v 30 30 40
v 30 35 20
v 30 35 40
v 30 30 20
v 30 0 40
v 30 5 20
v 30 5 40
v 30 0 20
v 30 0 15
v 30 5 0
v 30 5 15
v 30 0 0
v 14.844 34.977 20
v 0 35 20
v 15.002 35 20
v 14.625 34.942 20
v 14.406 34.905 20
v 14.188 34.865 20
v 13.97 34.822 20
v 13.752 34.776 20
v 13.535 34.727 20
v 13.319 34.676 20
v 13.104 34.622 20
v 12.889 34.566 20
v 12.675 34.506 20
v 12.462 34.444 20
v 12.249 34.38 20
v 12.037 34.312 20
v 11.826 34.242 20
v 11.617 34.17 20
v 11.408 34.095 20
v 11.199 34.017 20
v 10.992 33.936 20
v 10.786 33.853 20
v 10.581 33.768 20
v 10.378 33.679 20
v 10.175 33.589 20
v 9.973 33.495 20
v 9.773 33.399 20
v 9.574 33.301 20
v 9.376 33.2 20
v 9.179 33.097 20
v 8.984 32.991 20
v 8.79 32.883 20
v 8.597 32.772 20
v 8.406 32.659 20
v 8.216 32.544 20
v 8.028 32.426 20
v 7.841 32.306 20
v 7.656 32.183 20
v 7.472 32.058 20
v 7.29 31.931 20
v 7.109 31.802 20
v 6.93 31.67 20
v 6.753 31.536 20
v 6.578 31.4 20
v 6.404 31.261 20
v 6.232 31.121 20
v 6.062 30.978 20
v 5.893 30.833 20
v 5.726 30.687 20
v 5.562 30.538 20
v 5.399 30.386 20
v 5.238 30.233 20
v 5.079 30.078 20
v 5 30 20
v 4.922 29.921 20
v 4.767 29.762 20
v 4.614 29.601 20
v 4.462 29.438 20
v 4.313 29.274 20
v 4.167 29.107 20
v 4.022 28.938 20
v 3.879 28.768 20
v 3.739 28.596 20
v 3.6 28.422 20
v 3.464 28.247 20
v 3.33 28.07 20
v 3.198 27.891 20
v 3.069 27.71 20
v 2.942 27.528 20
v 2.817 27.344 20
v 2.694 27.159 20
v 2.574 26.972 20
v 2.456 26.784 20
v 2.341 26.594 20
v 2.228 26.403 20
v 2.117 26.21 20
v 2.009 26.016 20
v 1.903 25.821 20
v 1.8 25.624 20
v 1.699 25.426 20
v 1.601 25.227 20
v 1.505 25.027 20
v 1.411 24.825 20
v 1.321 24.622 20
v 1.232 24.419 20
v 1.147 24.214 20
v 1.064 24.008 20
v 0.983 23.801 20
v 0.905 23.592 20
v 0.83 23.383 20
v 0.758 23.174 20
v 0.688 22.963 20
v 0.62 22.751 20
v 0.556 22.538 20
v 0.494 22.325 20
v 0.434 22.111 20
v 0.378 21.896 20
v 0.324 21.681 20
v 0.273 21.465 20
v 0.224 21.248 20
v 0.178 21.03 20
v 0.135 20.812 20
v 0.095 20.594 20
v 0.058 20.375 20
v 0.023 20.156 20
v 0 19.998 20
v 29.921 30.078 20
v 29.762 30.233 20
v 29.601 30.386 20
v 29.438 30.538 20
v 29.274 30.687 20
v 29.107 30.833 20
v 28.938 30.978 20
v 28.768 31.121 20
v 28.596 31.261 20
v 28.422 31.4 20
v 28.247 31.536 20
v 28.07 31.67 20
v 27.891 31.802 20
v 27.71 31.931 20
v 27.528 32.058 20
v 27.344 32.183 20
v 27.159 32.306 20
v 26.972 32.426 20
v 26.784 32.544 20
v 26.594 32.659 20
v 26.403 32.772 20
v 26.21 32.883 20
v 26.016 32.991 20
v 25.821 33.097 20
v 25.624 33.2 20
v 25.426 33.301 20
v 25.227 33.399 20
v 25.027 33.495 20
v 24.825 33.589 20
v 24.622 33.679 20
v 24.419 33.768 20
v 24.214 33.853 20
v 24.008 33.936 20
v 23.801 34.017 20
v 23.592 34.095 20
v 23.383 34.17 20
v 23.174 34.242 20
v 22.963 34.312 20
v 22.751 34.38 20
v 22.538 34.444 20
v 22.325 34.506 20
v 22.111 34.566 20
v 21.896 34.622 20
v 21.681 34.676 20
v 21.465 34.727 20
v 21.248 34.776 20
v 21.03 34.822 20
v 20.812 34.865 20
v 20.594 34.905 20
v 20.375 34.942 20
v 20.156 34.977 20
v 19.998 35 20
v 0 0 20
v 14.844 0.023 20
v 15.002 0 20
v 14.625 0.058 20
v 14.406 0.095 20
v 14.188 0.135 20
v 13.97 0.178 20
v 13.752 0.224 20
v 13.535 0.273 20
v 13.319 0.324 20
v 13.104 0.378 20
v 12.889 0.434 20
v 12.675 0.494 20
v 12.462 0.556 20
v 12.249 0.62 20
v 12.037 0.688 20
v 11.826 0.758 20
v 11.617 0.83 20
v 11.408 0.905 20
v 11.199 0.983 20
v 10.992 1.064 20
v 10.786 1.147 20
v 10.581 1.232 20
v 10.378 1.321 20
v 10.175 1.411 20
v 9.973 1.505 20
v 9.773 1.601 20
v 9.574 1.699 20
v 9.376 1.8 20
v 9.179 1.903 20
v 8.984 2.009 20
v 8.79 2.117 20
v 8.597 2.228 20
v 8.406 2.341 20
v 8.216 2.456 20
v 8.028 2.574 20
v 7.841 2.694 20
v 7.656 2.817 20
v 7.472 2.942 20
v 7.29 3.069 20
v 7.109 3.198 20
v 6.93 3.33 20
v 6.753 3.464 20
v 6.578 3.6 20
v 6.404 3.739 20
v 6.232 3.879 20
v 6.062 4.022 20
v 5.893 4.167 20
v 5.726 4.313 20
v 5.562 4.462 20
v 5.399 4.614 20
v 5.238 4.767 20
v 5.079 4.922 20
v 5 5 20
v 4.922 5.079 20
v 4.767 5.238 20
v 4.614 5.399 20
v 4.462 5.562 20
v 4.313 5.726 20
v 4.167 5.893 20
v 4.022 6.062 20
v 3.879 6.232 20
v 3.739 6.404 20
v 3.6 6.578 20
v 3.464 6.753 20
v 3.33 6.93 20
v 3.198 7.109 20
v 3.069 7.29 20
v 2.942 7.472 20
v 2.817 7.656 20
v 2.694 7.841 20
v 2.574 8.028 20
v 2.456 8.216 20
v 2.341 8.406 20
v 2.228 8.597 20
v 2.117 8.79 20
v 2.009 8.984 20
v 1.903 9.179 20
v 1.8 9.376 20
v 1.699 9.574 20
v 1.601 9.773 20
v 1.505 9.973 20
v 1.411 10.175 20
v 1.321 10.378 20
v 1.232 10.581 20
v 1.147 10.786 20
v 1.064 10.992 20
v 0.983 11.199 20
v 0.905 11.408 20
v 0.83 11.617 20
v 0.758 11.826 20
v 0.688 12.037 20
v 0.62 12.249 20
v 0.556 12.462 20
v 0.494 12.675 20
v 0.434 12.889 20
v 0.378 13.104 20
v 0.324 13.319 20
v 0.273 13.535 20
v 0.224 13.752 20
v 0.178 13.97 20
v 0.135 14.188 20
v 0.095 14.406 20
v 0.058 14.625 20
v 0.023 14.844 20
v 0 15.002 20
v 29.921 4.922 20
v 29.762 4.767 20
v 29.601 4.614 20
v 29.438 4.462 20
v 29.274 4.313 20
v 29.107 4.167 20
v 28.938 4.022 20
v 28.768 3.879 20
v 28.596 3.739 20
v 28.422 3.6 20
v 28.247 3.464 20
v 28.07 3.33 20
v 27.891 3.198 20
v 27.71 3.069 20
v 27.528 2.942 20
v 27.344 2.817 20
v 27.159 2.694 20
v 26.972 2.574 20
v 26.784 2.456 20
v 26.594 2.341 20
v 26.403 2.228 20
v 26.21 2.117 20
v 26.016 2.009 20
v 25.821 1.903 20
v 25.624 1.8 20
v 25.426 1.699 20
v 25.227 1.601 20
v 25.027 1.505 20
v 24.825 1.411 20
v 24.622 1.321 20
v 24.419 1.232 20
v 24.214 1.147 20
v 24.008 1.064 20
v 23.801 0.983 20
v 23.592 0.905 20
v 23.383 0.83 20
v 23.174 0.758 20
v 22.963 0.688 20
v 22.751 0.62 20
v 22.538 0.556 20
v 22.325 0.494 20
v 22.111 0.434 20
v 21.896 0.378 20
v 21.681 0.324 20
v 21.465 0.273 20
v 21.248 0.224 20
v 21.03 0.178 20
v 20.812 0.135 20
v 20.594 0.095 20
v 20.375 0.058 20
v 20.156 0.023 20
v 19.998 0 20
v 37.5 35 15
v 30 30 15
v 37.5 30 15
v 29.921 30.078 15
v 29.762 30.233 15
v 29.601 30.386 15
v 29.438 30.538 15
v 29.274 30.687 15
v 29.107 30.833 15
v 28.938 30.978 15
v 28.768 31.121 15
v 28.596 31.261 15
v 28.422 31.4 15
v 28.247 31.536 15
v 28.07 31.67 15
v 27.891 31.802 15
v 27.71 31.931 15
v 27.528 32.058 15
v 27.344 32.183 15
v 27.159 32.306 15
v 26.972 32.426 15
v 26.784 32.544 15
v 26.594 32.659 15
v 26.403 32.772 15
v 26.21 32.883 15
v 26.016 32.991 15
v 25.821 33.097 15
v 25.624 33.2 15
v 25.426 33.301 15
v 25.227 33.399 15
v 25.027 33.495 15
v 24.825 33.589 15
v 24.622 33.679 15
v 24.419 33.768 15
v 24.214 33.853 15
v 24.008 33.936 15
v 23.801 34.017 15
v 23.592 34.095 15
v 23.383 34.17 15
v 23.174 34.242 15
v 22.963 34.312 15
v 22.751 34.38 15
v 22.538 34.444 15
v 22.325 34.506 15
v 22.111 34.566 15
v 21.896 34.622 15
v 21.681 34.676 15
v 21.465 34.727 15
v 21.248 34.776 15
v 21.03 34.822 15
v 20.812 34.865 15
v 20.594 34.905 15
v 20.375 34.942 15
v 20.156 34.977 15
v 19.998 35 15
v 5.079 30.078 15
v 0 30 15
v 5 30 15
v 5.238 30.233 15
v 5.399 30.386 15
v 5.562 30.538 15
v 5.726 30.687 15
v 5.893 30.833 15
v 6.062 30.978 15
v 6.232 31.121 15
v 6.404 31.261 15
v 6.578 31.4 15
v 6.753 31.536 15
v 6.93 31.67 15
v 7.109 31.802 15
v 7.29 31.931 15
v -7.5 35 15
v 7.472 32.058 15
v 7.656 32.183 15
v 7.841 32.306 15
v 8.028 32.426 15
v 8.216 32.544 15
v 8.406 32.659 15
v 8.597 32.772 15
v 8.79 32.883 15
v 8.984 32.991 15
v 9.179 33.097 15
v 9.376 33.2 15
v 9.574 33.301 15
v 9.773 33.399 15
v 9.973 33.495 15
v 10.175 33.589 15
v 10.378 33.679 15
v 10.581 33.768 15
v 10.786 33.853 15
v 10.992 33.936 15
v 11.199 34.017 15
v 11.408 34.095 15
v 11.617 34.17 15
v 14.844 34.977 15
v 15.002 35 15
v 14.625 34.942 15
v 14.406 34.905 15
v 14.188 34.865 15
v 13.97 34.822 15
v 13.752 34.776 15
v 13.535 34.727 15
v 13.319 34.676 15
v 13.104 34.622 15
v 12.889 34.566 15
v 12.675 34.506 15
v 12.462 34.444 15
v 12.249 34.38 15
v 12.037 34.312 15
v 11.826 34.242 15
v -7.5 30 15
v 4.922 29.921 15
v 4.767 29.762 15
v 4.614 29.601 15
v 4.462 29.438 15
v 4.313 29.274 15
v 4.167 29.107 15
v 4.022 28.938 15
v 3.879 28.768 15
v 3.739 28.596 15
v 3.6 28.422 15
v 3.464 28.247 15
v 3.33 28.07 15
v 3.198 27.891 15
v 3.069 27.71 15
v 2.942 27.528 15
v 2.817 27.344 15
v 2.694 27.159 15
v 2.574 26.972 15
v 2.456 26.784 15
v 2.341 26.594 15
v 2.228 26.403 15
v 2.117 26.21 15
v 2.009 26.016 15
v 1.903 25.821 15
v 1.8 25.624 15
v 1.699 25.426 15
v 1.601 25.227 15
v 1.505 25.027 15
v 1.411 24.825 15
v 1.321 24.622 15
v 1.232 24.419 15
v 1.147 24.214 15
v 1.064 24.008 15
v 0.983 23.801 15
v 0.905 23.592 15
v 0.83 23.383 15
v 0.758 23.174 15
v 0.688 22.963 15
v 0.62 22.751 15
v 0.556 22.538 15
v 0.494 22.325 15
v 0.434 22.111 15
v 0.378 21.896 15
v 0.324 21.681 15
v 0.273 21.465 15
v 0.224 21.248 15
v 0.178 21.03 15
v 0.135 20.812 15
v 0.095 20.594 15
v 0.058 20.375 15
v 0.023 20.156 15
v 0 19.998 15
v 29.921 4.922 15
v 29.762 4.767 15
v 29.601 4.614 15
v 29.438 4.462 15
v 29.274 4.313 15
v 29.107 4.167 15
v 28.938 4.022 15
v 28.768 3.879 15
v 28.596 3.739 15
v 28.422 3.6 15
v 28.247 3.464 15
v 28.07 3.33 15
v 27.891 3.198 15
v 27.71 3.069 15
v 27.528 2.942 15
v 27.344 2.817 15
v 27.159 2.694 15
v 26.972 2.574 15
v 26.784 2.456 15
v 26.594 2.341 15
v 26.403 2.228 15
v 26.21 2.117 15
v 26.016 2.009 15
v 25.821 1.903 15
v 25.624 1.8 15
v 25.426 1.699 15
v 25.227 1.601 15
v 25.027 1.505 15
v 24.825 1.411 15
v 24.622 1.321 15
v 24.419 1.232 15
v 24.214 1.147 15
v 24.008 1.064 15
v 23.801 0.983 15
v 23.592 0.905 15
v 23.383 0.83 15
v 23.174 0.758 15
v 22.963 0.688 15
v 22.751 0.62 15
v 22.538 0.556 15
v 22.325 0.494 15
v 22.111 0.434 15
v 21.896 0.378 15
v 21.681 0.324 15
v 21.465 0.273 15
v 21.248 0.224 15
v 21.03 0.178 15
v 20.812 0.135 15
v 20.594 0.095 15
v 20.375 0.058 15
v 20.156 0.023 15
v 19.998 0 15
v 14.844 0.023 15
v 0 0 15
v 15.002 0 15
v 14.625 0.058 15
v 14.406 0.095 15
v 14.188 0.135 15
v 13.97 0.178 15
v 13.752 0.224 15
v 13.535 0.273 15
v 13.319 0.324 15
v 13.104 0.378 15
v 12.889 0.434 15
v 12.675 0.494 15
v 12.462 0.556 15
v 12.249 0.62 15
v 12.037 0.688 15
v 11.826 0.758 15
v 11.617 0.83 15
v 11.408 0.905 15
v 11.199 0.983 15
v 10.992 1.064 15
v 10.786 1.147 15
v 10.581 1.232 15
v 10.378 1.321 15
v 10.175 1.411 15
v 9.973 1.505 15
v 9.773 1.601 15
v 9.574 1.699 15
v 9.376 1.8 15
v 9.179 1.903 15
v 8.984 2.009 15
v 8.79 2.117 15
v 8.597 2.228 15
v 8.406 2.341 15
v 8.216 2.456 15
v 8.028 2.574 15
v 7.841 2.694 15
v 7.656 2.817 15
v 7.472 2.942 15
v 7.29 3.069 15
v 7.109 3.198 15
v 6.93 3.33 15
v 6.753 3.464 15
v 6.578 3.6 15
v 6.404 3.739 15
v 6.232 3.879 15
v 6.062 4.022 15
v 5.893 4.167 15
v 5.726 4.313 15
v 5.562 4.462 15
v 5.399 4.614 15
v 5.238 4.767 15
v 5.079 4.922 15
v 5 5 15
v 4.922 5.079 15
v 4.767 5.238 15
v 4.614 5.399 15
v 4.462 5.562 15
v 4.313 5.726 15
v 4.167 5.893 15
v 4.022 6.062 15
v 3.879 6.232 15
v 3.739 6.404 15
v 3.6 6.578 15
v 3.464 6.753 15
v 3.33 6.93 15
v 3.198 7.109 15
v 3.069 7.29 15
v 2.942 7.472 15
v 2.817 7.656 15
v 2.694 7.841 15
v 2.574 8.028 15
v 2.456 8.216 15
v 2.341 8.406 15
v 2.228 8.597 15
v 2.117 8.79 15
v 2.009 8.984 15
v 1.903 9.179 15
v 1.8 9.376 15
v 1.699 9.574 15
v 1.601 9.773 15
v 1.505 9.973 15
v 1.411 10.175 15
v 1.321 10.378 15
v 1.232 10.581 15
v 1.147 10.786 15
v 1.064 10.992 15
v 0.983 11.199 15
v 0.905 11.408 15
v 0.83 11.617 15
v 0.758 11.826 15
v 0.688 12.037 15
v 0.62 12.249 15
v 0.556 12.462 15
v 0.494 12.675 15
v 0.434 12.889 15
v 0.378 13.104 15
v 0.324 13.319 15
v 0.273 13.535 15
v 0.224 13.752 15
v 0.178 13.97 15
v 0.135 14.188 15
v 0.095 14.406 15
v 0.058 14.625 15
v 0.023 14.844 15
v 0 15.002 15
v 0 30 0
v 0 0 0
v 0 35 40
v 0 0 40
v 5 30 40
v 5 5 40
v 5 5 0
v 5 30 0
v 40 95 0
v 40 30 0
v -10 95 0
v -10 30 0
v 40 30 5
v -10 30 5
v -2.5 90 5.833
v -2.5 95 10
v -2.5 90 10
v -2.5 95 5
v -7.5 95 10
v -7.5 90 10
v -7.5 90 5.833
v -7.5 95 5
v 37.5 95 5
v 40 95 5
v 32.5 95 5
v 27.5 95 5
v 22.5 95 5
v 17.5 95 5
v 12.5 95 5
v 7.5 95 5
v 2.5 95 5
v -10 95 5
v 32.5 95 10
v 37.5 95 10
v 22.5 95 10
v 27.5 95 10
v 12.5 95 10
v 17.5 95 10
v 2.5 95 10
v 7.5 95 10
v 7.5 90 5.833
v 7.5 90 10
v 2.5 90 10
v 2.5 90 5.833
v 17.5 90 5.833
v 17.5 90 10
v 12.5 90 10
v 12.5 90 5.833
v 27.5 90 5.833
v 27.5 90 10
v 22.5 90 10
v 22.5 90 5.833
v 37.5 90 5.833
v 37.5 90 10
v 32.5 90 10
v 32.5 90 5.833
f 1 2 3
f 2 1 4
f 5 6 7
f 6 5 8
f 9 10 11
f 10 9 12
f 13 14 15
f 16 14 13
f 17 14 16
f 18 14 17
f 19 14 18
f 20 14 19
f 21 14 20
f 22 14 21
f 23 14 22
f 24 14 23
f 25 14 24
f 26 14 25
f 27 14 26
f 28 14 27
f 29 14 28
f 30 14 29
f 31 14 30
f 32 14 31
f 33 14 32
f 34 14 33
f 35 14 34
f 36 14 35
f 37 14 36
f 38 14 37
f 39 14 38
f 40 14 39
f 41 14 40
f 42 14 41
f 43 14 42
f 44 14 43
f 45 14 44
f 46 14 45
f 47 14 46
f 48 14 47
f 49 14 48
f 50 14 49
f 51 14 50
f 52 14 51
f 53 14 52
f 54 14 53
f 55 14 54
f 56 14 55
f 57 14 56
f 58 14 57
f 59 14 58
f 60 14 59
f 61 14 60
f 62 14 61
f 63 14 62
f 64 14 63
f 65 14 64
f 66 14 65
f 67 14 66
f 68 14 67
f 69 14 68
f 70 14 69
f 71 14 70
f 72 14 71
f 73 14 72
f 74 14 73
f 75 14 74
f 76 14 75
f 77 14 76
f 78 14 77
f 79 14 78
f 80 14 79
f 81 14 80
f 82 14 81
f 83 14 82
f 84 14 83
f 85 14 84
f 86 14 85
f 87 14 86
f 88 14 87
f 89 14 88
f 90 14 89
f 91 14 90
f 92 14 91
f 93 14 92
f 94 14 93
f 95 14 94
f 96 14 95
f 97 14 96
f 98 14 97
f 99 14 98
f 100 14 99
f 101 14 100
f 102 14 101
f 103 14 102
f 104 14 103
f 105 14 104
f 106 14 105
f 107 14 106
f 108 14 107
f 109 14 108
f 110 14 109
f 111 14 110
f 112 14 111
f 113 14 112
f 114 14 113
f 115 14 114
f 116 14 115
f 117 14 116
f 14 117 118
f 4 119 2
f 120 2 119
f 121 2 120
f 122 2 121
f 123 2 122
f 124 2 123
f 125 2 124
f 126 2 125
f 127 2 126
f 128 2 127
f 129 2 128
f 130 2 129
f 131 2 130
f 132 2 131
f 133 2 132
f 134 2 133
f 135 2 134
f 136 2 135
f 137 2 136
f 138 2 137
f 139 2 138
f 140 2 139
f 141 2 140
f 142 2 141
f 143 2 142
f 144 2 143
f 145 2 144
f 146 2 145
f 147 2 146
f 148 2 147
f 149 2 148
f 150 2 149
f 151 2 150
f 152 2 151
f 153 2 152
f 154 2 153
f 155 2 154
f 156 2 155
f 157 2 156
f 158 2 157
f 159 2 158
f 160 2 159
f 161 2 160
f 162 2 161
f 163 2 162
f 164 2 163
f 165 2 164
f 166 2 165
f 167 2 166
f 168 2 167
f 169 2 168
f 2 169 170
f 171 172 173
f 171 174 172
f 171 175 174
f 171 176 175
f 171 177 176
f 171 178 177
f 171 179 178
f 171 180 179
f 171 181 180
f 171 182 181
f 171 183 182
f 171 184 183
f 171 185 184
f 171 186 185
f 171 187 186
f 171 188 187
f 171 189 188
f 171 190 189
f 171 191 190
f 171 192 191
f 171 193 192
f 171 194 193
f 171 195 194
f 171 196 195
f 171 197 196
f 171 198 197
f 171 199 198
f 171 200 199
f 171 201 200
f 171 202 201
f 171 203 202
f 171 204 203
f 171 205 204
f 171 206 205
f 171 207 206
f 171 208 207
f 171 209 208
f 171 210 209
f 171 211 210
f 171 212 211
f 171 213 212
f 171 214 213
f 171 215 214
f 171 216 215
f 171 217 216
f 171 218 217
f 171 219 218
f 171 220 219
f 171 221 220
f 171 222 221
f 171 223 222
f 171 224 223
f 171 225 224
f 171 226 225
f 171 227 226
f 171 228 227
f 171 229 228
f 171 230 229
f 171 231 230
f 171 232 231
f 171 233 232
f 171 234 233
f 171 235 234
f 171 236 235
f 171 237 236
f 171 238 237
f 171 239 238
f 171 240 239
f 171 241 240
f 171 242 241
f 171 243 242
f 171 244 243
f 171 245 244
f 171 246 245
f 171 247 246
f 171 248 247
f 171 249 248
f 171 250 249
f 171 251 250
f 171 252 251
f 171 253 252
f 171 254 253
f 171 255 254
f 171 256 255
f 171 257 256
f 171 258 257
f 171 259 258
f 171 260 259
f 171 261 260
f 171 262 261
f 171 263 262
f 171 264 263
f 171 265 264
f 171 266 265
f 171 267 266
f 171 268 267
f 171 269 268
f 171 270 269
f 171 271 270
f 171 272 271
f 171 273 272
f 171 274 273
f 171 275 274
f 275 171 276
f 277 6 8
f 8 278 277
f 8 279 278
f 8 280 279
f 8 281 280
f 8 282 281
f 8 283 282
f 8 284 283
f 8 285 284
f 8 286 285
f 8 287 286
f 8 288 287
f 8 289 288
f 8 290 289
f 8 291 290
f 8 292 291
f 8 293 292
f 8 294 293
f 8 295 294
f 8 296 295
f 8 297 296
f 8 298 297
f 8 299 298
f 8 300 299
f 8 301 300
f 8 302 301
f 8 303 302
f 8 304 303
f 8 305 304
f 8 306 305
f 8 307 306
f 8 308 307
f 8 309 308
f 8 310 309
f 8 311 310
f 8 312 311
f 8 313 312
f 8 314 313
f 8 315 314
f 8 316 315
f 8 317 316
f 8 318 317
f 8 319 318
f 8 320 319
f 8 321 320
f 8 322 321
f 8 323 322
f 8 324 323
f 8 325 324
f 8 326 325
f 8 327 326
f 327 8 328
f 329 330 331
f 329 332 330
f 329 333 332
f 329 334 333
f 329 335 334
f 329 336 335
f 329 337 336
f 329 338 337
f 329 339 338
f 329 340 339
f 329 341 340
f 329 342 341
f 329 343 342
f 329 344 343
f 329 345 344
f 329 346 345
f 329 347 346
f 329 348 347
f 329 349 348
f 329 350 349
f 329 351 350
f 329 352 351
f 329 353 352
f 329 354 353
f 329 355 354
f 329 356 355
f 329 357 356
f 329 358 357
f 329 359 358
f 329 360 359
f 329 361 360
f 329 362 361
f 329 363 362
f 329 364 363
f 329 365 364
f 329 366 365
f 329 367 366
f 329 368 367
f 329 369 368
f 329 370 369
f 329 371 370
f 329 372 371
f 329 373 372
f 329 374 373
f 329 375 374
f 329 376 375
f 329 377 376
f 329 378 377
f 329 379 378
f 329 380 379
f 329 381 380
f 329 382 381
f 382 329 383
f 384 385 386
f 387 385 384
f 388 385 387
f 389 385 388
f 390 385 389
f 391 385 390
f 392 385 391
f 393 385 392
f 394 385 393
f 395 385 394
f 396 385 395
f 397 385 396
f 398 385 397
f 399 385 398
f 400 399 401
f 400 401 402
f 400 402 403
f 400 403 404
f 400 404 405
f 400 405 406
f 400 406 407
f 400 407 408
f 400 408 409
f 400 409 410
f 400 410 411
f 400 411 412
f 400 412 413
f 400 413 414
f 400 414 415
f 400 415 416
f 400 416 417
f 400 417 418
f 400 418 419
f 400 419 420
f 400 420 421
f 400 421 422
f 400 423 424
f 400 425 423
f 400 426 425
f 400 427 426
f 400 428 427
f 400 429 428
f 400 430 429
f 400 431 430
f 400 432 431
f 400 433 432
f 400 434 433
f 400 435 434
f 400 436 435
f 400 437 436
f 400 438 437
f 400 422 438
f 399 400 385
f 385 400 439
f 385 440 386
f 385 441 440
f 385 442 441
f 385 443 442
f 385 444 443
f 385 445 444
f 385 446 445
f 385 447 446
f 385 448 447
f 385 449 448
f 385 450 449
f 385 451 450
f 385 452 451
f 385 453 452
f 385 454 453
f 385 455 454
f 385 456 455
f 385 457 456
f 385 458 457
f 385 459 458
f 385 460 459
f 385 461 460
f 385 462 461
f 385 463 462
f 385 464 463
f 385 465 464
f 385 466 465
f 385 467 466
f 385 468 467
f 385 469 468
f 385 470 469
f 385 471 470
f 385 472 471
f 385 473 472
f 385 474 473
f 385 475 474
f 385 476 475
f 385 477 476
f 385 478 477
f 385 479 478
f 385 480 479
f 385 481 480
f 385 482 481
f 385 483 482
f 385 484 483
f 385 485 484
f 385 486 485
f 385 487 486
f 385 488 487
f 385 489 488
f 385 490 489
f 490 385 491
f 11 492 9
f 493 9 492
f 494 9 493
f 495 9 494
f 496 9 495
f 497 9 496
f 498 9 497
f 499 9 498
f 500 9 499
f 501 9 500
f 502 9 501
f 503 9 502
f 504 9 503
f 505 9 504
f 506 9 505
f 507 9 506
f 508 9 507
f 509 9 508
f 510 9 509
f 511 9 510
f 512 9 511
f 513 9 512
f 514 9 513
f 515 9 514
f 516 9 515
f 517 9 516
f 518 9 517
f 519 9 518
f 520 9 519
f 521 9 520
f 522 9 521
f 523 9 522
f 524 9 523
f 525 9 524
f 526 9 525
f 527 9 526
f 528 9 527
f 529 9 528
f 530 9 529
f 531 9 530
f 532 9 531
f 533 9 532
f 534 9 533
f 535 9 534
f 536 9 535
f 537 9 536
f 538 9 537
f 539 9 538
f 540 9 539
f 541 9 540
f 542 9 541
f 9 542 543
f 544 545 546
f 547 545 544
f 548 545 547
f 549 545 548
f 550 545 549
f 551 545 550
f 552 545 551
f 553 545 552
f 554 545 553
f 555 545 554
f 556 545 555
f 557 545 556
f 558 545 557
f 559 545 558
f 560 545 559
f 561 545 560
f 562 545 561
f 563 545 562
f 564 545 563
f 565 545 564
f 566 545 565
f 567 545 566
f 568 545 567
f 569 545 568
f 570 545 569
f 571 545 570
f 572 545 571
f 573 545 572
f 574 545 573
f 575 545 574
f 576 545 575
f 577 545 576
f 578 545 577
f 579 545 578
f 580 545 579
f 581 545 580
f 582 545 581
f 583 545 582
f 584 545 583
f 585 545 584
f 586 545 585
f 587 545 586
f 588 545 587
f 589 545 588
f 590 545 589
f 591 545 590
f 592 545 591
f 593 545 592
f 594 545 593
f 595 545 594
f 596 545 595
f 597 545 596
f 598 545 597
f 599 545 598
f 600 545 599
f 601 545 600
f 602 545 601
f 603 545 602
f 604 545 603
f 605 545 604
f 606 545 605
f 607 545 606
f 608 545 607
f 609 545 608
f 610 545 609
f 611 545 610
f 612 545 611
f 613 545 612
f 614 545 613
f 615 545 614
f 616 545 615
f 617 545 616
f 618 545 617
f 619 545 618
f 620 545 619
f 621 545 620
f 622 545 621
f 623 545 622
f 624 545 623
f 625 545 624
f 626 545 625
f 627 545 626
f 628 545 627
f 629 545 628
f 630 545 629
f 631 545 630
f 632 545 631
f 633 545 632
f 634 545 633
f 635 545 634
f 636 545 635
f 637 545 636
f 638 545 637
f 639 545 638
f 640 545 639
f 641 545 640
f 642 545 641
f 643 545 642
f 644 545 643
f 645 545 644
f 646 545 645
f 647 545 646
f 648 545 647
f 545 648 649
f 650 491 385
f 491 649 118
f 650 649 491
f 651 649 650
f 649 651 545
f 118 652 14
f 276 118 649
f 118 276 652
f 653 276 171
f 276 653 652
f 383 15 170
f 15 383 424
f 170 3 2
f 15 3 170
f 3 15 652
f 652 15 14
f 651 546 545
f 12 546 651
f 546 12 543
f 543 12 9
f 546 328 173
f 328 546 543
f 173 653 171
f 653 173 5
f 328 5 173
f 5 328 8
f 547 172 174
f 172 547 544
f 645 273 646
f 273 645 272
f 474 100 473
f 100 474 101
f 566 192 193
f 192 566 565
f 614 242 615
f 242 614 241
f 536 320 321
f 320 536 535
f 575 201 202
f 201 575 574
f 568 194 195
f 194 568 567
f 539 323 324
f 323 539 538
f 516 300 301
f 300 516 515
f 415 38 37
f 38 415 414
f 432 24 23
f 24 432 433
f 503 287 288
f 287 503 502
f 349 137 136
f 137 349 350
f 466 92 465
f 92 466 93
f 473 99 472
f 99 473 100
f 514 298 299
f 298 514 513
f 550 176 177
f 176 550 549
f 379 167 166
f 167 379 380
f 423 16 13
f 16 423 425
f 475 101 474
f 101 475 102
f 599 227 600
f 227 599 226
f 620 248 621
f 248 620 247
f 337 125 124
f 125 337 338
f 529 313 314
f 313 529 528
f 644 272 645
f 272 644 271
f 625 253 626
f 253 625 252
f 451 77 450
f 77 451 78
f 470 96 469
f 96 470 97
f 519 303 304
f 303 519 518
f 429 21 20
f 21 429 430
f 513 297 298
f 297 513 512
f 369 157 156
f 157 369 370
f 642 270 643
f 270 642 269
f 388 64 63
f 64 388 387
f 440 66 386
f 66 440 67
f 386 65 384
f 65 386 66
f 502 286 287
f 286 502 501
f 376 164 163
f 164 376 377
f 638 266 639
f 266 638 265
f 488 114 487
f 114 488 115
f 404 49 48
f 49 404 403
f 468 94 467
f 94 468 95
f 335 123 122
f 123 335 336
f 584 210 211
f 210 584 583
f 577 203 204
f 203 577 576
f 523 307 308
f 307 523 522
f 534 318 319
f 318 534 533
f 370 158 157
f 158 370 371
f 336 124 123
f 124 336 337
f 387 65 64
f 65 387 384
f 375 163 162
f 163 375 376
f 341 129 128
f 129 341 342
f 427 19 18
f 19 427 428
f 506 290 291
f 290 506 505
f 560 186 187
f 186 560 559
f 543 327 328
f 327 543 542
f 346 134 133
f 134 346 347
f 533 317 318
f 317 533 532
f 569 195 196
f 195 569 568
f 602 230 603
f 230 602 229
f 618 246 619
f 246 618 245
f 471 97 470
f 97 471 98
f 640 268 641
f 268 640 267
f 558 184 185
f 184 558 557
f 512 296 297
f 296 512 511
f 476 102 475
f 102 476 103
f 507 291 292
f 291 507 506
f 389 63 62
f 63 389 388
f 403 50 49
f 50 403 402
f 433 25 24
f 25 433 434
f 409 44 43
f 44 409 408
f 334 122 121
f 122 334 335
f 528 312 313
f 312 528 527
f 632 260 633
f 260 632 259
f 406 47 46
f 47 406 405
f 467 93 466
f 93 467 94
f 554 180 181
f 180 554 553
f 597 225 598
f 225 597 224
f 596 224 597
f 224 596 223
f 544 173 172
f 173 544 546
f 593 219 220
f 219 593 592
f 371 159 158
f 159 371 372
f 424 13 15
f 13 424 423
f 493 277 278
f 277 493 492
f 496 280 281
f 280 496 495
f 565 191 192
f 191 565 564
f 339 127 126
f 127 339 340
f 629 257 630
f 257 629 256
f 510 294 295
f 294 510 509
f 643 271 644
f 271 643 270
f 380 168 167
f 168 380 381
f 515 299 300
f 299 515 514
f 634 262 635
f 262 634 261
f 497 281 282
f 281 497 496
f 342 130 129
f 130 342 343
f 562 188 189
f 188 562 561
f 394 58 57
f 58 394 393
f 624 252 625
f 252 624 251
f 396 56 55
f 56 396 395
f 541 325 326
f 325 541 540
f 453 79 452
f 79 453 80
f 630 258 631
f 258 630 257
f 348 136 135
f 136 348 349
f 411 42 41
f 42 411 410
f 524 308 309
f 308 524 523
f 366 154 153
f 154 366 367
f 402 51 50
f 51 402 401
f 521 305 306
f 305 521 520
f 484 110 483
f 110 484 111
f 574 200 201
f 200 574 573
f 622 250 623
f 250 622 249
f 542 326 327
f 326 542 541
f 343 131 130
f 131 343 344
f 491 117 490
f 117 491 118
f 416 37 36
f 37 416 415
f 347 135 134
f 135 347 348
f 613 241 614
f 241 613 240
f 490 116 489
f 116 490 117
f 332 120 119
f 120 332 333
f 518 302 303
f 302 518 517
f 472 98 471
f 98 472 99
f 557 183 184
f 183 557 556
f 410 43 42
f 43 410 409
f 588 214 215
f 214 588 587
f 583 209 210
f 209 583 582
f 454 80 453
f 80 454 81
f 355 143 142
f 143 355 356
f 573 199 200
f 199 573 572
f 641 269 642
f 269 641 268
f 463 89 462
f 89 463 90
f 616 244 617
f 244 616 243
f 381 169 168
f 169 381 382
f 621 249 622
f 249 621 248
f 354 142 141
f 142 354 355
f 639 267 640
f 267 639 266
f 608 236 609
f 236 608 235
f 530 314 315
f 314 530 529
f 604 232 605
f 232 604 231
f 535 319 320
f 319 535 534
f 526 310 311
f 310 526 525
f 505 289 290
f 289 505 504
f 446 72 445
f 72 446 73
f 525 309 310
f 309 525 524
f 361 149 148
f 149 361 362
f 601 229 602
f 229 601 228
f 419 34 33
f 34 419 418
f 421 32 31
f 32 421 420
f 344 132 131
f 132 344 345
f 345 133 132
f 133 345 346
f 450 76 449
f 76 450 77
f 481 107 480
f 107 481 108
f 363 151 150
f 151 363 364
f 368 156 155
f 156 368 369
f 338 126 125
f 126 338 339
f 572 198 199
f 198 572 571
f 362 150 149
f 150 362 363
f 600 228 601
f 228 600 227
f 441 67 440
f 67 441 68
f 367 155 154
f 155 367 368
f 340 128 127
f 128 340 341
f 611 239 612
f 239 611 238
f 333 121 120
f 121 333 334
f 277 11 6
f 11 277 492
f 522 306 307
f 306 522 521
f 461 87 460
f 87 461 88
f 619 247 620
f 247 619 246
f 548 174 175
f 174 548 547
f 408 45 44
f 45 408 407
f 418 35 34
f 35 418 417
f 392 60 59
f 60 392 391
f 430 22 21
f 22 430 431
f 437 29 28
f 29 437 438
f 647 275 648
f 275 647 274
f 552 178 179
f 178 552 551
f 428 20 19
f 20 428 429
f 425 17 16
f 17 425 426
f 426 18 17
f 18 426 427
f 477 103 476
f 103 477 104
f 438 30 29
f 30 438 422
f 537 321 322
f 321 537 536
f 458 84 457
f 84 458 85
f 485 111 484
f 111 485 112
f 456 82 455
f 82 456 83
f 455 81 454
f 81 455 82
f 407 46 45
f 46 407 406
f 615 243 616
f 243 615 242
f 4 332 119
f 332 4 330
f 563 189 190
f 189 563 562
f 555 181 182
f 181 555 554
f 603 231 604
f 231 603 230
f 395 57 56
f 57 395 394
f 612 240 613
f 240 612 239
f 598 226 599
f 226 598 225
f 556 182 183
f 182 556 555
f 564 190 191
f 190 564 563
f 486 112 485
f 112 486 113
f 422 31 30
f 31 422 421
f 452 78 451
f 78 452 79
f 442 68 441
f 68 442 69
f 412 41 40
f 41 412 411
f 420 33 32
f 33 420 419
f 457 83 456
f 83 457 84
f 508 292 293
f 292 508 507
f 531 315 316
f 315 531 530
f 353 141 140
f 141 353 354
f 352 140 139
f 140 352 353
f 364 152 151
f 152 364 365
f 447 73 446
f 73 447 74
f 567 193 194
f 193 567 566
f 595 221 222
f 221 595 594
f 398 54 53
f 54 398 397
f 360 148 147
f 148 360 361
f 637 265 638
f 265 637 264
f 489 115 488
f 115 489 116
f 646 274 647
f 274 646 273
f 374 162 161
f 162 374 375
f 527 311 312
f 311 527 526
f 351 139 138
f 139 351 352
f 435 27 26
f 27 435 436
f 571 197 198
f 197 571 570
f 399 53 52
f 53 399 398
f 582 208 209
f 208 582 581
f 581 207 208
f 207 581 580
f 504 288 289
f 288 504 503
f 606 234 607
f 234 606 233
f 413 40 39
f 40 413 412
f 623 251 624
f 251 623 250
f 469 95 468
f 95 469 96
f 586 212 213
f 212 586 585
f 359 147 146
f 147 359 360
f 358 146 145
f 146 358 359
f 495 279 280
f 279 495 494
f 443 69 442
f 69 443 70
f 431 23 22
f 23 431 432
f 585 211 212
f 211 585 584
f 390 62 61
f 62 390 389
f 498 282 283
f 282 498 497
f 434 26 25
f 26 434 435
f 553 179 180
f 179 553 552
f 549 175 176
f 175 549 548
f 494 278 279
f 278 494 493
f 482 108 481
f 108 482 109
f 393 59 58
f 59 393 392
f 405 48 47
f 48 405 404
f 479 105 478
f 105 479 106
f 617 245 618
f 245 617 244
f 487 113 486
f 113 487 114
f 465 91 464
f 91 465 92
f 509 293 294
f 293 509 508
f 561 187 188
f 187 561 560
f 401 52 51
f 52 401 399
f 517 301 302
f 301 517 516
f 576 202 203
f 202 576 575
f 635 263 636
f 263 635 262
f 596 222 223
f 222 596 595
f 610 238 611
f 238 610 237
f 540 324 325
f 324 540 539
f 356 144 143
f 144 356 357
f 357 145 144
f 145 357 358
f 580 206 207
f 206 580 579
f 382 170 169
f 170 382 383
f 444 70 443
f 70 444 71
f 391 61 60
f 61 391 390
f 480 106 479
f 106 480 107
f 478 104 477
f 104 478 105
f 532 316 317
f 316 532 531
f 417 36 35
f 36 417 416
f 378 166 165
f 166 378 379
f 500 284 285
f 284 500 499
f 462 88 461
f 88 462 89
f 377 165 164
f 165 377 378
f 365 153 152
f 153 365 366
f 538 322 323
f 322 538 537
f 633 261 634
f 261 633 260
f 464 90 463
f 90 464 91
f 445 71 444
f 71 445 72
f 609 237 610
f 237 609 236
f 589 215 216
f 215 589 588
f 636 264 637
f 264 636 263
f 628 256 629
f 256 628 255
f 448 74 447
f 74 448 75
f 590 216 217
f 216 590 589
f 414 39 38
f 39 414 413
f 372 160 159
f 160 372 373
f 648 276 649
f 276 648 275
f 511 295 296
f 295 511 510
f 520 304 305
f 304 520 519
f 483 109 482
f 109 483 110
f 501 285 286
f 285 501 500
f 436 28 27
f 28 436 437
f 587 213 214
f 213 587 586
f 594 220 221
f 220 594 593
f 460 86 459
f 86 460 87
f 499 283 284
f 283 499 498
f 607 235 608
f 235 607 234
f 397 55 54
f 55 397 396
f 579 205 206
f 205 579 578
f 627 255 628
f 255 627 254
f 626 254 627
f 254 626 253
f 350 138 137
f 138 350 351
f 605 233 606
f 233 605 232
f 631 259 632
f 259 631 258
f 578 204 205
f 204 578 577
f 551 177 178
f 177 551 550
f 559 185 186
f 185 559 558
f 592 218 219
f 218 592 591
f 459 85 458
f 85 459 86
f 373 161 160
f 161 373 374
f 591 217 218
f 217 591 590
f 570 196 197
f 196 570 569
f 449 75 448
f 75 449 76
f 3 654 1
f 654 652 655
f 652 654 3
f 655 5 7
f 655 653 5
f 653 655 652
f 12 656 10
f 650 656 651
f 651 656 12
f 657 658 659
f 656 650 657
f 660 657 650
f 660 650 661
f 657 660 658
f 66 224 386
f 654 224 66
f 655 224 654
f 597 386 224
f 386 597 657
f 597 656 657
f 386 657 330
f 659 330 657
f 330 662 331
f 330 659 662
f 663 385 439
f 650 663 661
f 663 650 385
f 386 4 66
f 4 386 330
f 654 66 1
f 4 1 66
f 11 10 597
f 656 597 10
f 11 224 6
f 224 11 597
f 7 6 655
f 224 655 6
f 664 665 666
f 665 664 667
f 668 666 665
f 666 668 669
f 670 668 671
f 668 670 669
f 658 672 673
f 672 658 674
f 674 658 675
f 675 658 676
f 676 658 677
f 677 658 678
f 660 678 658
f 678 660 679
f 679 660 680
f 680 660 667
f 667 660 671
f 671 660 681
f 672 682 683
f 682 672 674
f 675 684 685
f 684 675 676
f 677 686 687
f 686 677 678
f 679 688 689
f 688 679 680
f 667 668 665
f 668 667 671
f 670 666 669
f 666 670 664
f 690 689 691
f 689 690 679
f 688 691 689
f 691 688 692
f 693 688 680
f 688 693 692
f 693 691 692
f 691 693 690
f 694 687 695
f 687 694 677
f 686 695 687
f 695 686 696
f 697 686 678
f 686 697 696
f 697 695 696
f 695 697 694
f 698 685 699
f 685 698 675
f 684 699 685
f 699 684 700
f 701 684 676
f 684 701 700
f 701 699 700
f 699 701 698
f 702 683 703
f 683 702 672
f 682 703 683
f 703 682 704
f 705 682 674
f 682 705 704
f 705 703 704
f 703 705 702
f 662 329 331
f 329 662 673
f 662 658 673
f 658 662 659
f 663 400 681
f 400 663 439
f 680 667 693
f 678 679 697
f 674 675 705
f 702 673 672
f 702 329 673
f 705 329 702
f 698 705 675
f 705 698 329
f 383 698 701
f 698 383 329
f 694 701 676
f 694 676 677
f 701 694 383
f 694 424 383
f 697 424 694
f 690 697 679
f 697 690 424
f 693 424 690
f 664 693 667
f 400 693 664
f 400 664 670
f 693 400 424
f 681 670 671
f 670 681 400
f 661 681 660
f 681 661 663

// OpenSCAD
/**
 * @author Maciej Urbanski (rooter@kyberian.net)
 * @brief  Foot door pull - veritical
 * @license GPL
 * @date   May, 2020
 * @version 1.0
 *
 * Foot door pool for front gate (square bars).
 * Significantly weaker and as it would be mounted higher less practical
 * than horizontal version.
 */

gatebar_width = 25;
gatebar_depth = gatebar_width;

thickness = 5;
height = 40;

step_length = 60;
step_max_height = 3 * thickness;
step_width = 40;
step_tooth_height = thickness;
step_tooth_width = thickness;
step_tooth_spacing = thickness;

ziptie_width = 5;

$fn = 500;
TINY = 1;    // a small number, just to make to avoid renderer issues
INF = 10000; // a large number, virtually infitive

grab_w = gatebar_width + thickness;
grab_d = gatebar_depth + 2 * thickness;

union() {
  difference() {
    cube([ grab_w, grab_d, height ]);
    translate([ thickness, thickness, -TINY ])
        cube([ gatebar_width + TINY, gatebar_depth, INF ]);

    rr = gatebar_width * sqrt(2) / 2;
    translate([ 0, 0, step_max_height ]) {
      difference() {
        cube([ grab_w, grab_d, ziptie_width ]);
        translate([
          gatebar_width / 2 + thickness, gatebar_width / 2 + thickness, 0
        ]) {
          cylinder(h = ziptie_width, r = rr);
        }
      }
    }
  }

  translate([ -(step_width - gatebar_width) / 2, grab_d - thickness, 0 ]) {
    hull() {
      translate([ -thickness / 2, 0, 0 ]) cube(
          [ step_width + 2 * thickness, step_length + thickness, thickness ]);
      translate([ 0, 0, step_max_height - thickness ])
          cube([ step_width + thickness, thickness, thickness ]);
    }
    for (tooth_x = [0:step_tooth_width + step_tooth_spacing:step_width]) {
      translate([ tooth_x, step_length, thickness ]) {
        cube([ step_tooth_width, step_tooth_width, step_tooth_height ]);
      }
    }
  }
}
